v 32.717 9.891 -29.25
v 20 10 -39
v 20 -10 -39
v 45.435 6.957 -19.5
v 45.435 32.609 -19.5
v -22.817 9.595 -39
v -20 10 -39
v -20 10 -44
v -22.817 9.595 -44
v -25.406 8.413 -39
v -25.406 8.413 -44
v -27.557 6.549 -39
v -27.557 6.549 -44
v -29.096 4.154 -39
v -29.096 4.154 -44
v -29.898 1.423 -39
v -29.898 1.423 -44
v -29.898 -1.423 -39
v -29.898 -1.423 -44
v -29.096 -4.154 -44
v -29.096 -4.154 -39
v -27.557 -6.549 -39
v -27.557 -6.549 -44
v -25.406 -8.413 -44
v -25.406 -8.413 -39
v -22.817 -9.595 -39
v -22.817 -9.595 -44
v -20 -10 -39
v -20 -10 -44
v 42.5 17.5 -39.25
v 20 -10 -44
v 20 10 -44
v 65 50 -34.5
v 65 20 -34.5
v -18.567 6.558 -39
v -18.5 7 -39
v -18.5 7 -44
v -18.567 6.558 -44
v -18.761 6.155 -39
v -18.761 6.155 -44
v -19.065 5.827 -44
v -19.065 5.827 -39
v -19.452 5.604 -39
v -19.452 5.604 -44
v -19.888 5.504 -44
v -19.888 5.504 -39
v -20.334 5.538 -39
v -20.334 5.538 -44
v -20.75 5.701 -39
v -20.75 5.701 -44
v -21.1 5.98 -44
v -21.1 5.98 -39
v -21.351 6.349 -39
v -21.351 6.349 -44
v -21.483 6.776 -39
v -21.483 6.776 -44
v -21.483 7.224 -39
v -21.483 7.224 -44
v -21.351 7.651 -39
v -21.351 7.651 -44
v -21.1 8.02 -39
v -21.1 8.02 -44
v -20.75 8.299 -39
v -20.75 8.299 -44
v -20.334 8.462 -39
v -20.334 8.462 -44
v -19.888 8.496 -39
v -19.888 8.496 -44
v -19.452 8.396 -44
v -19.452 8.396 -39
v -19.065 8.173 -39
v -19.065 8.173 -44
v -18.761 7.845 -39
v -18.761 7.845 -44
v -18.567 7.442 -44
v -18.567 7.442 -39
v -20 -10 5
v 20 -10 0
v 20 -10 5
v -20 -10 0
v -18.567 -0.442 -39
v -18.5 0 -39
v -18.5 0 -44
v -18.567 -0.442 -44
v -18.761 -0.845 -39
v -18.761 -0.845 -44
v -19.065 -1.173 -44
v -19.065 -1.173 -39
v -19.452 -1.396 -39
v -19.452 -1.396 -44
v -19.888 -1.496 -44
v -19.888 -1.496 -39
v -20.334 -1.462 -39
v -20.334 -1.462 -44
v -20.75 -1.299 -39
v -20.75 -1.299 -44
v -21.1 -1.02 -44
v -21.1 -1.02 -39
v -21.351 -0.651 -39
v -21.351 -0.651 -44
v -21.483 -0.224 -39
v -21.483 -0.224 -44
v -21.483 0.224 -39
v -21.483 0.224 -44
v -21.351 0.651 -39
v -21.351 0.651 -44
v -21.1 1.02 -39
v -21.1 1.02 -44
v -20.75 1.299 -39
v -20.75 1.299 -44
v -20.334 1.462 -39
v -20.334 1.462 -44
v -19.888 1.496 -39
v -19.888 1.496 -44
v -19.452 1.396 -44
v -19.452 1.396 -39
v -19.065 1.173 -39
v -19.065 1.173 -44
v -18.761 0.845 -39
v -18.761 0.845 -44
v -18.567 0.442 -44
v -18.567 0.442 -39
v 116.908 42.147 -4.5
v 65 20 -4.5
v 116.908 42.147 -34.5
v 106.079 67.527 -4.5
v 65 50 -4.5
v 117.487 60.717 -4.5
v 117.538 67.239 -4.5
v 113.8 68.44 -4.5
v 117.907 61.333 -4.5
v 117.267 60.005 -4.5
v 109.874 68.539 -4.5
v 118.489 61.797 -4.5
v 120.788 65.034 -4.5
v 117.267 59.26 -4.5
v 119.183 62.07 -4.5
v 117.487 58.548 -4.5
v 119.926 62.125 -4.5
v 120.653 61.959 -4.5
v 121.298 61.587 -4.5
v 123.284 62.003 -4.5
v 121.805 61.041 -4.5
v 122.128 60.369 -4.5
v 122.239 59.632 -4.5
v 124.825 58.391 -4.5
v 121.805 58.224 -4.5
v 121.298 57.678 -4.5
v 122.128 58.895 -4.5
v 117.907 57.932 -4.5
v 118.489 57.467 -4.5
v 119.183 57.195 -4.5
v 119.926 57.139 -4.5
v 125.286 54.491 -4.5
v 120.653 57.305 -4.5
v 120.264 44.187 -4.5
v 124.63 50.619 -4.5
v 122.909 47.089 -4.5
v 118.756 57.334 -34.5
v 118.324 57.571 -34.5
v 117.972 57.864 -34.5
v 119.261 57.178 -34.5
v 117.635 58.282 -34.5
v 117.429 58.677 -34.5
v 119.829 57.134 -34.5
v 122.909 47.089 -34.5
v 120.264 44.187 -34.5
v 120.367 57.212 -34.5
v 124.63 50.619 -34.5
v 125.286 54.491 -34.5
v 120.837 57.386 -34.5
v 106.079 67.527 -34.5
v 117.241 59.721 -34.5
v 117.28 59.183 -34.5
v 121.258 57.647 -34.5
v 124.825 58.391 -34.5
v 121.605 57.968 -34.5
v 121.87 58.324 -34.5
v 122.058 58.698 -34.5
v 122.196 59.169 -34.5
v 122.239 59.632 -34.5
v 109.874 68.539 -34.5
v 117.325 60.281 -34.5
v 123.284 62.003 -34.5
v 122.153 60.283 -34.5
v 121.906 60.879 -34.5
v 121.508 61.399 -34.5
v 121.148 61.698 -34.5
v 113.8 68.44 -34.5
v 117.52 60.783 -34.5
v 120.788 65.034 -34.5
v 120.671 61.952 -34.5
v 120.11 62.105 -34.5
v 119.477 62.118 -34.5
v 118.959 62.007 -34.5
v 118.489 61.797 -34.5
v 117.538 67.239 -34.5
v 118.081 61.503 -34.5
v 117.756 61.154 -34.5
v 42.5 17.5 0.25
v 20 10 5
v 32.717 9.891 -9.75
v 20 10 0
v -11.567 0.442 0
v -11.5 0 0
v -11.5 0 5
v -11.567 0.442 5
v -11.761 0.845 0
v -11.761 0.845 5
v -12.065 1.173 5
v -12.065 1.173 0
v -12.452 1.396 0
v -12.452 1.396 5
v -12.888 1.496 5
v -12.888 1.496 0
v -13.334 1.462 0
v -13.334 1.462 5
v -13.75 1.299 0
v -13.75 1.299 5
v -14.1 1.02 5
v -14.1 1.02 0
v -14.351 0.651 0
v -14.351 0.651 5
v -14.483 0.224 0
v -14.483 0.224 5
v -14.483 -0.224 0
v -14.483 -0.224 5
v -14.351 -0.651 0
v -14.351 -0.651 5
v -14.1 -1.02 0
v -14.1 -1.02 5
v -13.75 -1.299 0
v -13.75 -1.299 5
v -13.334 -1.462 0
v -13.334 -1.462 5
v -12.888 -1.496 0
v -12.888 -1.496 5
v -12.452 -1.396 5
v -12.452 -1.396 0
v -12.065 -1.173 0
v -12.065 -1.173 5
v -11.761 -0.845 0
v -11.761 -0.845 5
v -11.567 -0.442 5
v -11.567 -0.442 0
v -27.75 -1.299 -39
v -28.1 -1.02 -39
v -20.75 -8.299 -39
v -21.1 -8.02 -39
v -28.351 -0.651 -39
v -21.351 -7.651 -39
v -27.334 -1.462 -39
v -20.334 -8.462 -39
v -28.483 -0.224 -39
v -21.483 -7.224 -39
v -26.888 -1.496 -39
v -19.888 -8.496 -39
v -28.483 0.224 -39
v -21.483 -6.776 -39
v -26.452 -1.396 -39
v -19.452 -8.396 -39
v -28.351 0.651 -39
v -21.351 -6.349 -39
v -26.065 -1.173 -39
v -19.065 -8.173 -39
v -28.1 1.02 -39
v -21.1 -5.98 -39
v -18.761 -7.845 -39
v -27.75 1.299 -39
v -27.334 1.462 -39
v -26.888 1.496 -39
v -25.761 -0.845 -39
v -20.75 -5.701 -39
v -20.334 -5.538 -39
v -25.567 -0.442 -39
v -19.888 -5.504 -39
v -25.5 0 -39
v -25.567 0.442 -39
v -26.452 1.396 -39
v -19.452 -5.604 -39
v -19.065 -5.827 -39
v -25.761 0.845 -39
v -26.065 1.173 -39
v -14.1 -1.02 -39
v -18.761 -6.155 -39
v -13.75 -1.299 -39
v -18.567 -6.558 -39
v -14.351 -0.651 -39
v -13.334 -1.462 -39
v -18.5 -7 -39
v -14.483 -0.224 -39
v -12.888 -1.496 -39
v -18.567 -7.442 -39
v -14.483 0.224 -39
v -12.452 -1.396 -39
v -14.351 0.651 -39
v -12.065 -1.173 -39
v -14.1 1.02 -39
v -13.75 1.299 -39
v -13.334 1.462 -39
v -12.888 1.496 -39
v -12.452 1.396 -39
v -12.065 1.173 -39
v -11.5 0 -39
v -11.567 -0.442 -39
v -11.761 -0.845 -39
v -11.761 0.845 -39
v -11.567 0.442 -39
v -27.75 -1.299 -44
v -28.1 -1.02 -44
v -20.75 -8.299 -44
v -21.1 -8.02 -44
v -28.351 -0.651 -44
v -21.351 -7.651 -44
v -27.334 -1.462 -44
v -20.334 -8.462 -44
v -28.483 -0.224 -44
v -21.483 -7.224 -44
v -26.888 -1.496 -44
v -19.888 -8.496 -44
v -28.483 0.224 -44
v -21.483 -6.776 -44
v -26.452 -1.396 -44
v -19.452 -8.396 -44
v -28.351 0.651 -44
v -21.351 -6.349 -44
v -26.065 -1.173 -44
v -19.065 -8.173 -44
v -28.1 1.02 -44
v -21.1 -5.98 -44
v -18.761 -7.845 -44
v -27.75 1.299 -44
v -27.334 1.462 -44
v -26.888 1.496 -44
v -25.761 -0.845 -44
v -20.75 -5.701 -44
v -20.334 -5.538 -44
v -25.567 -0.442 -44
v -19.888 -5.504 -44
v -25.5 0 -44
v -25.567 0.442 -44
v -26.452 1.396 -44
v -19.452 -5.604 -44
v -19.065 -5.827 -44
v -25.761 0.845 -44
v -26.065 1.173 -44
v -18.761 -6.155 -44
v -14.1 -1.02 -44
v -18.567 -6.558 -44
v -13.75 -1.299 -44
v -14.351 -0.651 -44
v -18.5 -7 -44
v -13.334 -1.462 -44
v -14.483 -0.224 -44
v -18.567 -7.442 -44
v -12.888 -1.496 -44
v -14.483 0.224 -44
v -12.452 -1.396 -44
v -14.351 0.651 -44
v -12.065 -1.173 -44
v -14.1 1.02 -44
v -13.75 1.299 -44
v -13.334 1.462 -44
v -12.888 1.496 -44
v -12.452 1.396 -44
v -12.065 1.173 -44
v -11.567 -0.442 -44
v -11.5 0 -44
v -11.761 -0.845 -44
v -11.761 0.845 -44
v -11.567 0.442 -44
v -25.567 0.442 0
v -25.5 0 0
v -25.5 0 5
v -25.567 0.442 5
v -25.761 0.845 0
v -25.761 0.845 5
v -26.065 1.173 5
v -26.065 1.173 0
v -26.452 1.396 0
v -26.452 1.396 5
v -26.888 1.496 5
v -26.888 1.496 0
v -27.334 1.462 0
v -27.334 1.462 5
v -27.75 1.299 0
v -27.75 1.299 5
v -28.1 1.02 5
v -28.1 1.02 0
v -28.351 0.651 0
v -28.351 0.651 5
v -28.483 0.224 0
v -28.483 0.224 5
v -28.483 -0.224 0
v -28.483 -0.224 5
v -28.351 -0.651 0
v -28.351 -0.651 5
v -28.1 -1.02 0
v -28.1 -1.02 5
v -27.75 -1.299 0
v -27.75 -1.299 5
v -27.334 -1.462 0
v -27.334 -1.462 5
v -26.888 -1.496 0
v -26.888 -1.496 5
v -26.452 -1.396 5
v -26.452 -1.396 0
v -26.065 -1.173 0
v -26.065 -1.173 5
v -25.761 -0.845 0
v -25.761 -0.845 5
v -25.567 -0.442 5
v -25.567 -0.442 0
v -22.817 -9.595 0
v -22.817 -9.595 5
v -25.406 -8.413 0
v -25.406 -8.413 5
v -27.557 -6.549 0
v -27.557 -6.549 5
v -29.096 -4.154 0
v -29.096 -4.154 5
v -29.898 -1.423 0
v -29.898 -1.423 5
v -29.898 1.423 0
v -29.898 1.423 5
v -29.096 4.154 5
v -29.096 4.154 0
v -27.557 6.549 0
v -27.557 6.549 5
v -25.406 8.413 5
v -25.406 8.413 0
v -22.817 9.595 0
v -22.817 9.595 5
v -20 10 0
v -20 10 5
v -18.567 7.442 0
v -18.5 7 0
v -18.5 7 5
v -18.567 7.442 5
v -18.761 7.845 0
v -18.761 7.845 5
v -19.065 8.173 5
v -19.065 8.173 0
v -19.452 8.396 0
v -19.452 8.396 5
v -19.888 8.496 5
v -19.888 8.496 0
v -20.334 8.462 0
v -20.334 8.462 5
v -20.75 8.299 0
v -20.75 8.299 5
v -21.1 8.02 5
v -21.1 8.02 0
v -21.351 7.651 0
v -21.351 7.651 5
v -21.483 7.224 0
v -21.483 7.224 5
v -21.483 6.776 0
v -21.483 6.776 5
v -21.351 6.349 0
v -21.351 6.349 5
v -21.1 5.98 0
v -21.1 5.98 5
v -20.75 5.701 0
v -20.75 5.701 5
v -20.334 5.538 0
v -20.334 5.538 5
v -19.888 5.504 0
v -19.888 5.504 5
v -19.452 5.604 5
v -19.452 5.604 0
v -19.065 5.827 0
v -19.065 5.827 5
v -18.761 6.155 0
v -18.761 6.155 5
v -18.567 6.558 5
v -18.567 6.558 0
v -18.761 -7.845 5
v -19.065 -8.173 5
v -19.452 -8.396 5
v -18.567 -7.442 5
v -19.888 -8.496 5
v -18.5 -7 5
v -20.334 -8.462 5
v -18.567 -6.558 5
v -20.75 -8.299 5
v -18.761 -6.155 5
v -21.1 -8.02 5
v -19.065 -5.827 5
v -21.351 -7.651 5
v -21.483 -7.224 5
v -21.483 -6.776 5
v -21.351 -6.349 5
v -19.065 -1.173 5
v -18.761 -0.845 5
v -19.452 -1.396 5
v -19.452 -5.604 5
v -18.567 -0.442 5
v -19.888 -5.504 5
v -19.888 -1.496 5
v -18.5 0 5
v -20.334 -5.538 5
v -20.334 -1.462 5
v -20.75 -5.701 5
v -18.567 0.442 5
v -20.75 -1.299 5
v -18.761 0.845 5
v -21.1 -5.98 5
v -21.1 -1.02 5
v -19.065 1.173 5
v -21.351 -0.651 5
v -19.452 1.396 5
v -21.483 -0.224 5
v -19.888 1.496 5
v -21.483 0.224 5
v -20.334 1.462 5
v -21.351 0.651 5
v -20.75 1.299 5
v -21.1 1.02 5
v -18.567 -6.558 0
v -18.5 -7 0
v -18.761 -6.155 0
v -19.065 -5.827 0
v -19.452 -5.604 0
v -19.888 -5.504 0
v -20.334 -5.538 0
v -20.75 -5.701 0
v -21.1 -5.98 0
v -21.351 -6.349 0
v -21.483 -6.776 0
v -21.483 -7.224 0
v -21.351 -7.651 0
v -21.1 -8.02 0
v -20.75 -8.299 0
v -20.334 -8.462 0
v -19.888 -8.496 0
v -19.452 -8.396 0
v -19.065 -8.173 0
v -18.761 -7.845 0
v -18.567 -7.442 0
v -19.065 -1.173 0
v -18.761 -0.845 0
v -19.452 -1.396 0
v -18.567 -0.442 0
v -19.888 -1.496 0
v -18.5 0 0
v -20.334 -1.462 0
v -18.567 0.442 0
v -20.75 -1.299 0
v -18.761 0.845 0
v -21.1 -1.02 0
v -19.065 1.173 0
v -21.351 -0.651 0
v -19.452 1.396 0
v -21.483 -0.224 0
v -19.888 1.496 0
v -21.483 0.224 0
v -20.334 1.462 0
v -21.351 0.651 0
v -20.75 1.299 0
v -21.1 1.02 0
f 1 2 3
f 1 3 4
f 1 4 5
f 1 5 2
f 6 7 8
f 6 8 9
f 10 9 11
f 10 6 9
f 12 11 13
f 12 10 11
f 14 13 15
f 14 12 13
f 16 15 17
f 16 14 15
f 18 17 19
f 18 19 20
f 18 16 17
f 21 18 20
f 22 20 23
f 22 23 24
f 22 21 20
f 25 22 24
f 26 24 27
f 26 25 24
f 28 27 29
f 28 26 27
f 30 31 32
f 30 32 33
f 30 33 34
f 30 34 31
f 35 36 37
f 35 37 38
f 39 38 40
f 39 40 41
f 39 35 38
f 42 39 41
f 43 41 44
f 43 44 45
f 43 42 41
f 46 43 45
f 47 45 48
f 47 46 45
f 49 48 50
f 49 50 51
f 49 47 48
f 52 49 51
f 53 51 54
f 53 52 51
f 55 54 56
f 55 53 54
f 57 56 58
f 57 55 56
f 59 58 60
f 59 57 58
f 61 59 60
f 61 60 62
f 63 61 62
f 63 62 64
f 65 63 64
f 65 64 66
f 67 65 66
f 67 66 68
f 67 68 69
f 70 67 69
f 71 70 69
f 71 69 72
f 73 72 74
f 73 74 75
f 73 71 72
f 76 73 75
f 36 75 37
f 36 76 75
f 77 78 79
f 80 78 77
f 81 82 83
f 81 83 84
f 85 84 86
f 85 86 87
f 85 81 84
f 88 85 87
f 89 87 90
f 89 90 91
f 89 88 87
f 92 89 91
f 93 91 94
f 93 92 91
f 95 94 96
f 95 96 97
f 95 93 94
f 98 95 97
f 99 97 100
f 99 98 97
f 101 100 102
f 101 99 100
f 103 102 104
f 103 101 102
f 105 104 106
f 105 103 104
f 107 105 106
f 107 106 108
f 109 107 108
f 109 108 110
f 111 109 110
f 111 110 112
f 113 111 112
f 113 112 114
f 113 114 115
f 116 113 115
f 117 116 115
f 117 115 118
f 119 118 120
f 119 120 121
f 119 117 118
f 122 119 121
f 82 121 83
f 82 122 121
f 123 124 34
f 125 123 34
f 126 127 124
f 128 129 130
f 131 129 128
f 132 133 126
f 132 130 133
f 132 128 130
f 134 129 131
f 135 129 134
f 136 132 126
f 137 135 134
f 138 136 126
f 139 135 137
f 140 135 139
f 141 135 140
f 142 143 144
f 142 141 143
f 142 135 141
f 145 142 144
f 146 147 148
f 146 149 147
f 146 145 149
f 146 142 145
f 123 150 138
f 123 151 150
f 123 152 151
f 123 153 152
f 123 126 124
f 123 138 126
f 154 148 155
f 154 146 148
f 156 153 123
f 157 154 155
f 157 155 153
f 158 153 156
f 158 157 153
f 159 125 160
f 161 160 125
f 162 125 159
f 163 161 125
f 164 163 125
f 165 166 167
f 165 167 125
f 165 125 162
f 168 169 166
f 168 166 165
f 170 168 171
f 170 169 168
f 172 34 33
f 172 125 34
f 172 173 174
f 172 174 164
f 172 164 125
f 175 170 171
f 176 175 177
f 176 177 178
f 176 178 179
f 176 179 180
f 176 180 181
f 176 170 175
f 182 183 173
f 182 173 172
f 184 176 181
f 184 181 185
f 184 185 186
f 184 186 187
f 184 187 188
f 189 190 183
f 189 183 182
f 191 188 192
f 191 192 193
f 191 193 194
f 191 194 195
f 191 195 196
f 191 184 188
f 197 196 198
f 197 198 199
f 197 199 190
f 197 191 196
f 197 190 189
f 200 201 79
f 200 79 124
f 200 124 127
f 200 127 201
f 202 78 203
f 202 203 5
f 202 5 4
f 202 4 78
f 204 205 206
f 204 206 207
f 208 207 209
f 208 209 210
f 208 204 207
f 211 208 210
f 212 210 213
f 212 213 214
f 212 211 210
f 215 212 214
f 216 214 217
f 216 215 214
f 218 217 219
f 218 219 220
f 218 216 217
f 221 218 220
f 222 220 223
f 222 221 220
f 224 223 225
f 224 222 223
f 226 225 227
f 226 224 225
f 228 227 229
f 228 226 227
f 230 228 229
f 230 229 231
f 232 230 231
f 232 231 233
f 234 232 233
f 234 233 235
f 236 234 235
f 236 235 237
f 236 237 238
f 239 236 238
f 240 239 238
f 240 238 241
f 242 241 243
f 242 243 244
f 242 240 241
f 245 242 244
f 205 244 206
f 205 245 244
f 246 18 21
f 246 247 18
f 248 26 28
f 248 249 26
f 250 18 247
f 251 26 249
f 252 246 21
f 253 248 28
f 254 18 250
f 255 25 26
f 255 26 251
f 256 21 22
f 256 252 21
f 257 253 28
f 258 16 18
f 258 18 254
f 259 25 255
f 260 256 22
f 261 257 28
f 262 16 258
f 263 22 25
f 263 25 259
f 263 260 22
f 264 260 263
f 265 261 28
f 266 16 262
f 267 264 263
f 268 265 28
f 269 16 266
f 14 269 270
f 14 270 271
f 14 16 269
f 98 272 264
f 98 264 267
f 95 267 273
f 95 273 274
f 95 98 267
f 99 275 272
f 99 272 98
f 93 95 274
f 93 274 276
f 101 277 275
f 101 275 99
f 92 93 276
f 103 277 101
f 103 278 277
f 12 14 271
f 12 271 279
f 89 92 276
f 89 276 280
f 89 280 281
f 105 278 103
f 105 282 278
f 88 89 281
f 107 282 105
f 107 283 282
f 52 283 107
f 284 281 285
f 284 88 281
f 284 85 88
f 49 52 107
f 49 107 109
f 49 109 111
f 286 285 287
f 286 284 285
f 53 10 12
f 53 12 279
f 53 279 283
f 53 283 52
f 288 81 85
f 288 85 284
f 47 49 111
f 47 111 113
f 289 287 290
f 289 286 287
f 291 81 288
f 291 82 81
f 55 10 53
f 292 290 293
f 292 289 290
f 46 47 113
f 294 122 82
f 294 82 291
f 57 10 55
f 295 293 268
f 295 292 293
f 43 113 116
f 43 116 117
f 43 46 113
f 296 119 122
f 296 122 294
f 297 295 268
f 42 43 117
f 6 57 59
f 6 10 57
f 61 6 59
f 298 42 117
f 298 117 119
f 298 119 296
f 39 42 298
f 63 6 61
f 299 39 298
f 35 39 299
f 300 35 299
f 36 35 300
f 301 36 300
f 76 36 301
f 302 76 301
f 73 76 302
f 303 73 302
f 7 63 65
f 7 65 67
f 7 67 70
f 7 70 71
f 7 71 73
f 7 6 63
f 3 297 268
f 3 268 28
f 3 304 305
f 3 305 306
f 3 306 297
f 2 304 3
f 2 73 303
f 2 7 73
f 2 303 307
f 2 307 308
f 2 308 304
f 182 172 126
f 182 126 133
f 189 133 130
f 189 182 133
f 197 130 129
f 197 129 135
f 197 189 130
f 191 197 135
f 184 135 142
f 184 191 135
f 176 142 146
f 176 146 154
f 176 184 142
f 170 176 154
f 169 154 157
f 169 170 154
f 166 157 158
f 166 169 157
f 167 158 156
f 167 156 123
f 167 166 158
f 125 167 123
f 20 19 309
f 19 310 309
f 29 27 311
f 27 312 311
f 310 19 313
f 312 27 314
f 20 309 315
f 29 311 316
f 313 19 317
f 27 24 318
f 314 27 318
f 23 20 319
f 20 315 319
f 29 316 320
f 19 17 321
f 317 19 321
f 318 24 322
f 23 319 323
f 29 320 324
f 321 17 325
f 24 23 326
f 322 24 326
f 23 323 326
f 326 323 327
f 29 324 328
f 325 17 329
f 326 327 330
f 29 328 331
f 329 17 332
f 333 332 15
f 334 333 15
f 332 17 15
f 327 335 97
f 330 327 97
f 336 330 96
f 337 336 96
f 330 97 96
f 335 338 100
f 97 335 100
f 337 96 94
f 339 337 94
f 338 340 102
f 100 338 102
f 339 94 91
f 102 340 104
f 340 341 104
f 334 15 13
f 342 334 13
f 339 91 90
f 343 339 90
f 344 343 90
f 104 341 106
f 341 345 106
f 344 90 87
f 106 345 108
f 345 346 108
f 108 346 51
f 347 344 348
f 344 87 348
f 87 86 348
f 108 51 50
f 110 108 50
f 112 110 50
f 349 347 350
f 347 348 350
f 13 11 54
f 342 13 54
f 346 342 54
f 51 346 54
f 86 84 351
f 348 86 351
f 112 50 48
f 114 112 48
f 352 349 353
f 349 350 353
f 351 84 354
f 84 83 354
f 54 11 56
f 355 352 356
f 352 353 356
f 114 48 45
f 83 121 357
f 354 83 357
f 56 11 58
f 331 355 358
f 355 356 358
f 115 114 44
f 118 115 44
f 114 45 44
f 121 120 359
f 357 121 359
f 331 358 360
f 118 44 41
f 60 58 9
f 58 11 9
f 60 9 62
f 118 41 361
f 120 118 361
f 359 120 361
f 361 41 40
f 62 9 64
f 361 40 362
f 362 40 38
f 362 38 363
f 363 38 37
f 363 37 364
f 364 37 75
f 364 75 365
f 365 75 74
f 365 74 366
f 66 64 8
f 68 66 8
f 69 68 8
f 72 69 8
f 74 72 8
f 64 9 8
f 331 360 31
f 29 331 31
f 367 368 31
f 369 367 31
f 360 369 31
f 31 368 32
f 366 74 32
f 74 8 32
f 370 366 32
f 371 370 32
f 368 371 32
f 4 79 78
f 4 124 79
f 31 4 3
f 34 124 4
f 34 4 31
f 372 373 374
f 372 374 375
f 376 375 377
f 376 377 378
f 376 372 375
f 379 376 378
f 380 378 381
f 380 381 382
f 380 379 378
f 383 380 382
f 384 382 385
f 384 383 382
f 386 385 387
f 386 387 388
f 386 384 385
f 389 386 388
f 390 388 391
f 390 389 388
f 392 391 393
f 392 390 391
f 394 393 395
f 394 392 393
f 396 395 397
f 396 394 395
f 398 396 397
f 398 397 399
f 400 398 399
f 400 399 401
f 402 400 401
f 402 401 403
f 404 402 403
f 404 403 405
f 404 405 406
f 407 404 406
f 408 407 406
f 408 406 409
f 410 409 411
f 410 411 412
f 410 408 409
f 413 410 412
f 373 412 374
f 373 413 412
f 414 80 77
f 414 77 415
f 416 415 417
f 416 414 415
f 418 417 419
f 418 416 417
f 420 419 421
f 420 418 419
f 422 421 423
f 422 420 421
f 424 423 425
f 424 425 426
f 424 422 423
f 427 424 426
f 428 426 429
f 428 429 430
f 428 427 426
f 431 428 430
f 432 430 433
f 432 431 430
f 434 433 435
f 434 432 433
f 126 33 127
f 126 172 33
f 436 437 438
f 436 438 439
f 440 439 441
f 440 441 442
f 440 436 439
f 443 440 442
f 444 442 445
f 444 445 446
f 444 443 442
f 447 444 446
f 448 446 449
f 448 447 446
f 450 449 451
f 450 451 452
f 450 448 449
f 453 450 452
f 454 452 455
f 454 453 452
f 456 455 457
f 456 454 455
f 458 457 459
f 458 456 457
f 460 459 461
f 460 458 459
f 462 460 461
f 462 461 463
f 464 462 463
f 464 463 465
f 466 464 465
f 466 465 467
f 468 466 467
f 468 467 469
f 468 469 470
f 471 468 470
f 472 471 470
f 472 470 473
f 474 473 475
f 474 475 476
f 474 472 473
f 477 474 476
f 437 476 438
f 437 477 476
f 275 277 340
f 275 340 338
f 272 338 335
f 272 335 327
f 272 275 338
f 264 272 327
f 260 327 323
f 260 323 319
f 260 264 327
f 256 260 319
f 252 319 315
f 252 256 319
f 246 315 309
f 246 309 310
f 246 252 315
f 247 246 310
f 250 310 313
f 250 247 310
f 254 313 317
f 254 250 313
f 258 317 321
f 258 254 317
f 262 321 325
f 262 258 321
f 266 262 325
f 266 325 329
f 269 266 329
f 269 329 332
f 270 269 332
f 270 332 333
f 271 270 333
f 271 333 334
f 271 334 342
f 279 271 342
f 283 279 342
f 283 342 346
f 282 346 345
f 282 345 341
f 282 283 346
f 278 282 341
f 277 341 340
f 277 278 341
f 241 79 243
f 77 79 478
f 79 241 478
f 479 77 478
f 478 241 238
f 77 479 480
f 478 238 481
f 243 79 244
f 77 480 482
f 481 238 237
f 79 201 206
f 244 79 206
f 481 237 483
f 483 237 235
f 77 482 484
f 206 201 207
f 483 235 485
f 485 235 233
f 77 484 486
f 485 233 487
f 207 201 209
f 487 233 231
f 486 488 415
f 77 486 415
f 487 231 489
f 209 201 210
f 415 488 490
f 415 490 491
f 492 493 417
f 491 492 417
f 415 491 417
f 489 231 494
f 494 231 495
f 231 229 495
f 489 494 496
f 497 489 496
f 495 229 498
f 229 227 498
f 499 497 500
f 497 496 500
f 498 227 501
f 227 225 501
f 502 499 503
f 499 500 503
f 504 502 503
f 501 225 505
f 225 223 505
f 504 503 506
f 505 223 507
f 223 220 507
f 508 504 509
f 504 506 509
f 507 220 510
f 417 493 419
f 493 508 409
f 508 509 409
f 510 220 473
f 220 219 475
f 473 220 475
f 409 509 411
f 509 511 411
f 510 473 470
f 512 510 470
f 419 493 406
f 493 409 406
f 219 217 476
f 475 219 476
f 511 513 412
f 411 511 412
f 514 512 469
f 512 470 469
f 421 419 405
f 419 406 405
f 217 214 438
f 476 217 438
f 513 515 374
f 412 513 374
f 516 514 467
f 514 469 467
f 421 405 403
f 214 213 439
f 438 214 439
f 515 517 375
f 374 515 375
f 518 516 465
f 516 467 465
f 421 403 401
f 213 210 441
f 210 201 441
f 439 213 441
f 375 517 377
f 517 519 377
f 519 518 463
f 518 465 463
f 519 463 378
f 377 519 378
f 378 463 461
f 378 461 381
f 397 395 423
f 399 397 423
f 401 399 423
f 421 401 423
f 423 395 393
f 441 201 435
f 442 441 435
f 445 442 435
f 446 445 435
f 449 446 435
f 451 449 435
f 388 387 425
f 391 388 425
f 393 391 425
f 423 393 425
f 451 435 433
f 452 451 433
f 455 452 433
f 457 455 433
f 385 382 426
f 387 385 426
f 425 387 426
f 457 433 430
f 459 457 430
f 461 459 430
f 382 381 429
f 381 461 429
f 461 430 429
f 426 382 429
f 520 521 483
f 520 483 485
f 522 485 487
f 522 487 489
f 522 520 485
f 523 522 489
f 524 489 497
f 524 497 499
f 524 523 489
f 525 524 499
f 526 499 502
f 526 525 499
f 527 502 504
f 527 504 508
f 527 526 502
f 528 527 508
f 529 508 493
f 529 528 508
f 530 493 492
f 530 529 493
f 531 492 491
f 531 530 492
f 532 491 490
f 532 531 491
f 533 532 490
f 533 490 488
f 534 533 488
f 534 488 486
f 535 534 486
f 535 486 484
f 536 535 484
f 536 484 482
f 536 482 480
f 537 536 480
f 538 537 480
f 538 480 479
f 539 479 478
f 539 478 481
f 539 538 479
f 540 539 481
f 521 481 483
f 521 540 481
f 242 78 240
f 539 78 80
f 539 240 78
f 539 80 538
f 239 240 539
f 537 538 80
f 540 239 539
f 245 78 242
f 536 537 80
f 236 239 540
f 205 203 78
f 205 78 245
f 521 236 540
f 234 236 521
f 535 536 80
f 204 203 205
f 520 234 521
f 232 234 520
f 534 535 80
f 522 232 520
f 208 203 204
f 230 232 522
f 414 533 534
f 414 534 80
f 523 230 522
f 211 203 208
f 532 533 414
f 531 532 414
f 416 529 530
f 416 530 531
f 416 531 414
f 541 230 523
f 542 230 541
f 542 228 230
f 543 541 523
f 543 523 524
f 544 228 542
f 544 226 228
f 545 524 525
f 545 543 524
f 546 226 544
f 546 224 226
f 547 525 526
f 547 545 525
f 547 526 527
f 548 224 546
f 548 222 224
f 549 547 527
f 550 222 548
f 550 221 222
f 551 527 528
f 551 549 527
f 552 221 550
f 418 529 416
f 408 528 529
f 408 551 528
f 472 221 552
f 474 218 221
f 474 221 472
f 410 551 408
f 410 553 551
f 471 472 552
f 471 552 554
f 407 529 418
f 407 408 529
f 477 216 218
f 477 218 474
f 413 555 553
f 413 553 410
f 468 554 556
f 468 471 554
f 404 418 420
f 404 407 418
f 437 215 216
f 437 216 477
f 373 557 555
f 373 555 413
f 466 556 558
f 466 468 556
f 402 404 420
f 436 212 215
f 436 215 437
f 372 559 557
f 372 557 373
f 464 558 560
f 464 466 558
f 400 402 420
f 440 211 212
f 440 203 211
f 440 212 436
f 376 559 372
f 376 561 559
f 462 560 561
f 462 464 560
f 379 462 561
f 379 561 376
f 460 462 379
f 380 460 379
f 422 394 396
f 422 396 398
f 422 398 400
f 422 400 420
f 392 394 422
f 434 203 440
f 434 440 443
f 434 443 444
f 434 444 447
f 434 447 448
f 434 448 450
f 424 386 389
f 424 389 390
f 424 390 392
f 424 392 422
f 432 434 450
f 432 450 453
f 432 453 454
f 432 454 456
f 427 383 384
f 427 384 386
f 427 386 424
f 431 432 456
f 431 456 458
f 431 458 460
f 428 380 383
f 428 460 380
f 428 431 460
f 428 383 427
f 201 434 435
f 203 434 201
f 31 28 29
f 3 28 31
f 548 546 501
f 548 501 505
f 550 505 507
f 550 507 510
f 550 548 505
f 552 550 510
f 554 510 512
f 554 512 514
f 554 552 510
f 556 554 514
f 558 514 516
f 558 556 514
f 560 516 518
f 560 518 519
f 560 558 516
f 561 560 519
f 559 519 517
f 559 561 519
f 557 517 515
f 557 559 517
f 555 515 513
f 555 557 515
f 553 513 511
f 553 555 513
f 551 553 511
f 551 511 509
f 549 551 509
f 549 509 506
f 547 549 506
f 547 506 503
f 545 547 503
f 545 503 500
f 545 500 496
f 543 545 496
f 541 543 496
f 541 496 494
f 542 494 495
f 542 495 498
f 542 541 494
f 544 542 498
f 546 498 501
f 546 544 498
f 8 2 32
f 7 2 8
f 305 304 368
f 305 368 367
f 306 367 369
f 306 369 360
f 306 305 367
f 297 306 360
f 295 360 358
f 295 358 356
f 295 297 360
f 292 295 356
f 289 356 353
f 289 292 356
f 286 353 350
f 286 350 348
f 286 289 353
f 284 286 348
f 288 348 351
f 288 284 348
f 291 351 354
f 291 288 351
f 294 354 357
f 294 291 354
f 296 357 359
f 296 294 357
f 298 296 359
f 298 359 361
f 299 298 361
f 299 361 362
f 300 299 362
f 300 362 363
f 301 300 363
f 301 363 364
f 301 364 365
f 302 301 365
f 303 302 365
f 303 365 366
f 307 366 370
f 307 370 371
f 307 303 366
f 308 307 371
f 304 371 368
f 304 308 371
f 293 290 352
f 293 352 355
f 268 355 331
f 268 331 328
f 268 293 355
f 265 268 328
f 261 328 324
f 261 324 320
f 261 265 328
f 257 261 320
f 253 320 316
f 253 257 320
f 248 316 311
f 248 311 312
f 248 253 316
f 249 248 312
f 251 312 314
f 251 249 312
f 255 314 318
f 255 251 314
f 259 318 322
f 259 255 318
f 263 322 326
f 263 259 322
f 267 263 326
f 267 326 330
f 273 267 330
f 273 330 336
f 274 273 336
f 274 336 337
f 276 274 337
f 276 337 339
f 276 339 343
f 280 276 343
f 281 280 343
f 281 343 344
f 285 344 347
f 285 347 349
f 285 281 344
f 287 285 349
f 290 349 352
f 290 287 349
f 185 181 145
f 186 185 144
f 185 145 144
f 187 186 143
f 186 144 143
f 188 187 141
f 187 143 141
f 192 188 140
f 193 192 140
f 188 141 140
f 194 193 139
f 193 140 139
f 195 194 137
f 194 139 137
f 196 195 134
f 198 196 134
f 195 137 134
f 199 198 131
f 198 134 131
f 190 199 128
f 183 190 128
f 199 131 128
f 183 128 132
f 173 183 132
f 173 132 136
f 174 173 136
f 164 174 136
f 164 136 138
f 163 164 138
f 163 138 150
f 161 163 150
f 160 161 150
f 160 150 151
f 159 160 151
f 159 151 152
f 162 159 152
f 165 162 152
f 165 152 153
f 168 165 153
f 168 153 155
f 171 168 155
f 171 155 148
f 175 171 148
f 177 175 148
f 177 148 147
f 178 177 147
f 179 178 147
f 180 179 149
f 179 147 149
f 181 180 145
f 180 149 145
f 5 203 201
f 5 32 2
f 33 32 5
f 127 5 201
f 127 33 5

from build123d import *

# Parameters (mm, degrees)
SKETCH1_R           = 1.5
BOSS_EXTRUDE1_DEPTH = 5
SKETCH2_R           = 1.5
BOSS_EXTRUDE2_DEPTH = 5
SPLIT6_START        = -34.5
SPLIT6_DEPTH        = 30
SKETCH24_R          = 2.5
CUT_EXTRUDE3_DEPTH  = 149.21791213


# Read off the part's stored shape, not the designer's step: Split6
with BuildPart() as part:
    # Sketch1 → Boss-Extrude1 (new body)
    with BuildSketch(Plane.XY):
        with BuildLine():
            Line((-20, 10), (20, 10))
            Line((20, 10), (20, -10))
            Line((20, -10), (-20, -10))
            ThreePointArc((-20, -10), (-30, 0), (-20, 10))
        make_face()
        with Locations((-20, 0)):
            Circle(SKETCH1_R, mode=Mode.SUBTRACT)
        with Locations((-20, -7)):
            Circle(SKETCH1_R, mode=Mode.SUBTRACT)
        with Locations((-27, 0)):
            Circle(SKETCH1_R, mode=Mode.SUBTRACT)
        with Locations((-20, 7)):
            Circle(SKETCH1_R, mode=Mode.SUBTRACT)
        with Locations((-13, 0)):
            Circle(SKETCH1_R, mode=Mode.SUBTRACT)
    extrude(amount=BOSS_EXTRUDE1_DEPTH)



with BuildPart() as body_2:
    # Sketch2 → Boss-Extrude2 (new body)
    with BuildSketch(Plane(origin=(0, 0, -39), x_dir=(-1, 0, 0), z_dir=(0, 0, -1))):
        with BuildLine():
            Line((-20, 10), (20, 10))
            ThreePointArc((20, 10), (30, 0), (20, -10))
            Line((20, -10), (-20, -10))
            Line((-20, -10), (-20, 10))
        make_face()
        with Locations(Location((20, 0, 0), (0, 0, 180))):
            Circle(SKETCH2_R, mode=Mode.SUBTRACT)
        with Locations(Location((13, 0, 0), (0, 0, 180))):
            Circle(SKETCH2_R, mode=Mode.SUBTRACT)
        with Locations(Location((20, 7, 0), (0, 0, 180))):
            Circle(SKETCH2_R, mode=Mode.SUBTRACT)
        with Locations(Location((27, 0, 0), (0, 0, 180))):
            Circle(SKETCH2_R, mode=Mode.SUBTRACT)
        with Locations(Location((20, -7, 0), (0, 0, 180))):
            Circle(SKETCH2_R, mode=Mode.SUBTRACT)
    extrude(amount=BOSS_EXTRUDE2_DEPTH)

    # Sketch12 → section 1 of loft1
    with BuildSketch(Plane(origin=(65, 0, 0), x_dir=(0, 0, -1), z_dir=(1, 0, 0)), mode=Mode.PRIVATE) as loft1_s1:
        with BuildLine():
            Line((4.5, 50), (34.5, 50))
            Line((34.5, 50), (34.5, 20))
            Line((34.5, 20), (4.5, 20))
            Line((4.5, 20), (4.5, 50))
        make_face()
    # loft from a face of the part (loft1)
    loft([body_2.faces().sort_by_distance((20, 0, -41.5))[0], loft1_s1.sketch])


with BuildPart() as part_1:
    add(part.part)

    add(body_2.part)  # loft2 joins it to this body
    # loft from a face of the part (loft2)
    loft([part_1.faces().sort_by_distance((20, 0, 2.5))[0], part_1.faces().sort_by_distance((65, 35, -19.5))[0]])

    # Sketch18 → section 1 of loft3
    with BuildSketch(Plane(origin=(140, 0, 0), x_dir=(0, 0, -1), z_dir=(1, 0, 0)), mode=Mode.PRIVATE) as loft3_s1:
        with BuildLine():
            Line((4.5, 82), (34.5, 82))
            Line((34.5, 82), (34.5, 52))
            Line((34.5, 52), (4.5, 52))
            Line((4.5, 52), (4.5, 82))
        make_face()
    # loft from a face of the part (loft3)
    loft([part_1.faces().sort_by_distance((65, 35, -19.5))[0], loft3_s1.sketch])

    # Split6 outline → Split6 (cut)
    with BuildSketch(Plane.XY.offset(SPLIT6_START)):
        with BuildLine():
            ThreePointArc((106.079345998, 67.527187626), (124.183572198, 60.251657472), (116.908042043, 42.147431272))
            Line((116.908042043, 42.147431272), (140, 52))
            Line((140, 52), (140, 82))
            Line((140, 82), (106.079345998, 67.527187626))
        make_face()
    extrude(amount=SPLIT6_DEPTH, mode=Mode.SUBTRACT)

    # Sketch24 → Cut-Extrude3 (cut, through all)
    with BuildSketch(Plane.XY.offset(-4.5)):
        with Locations((119.739276472, 59.632240301)):
            Circle(SKETCH24_R)
    extrude(amount=-CUT_EXTRUDE3_DEPTH, mode=Mode.SUBTRACT)


solid = part_1.part
